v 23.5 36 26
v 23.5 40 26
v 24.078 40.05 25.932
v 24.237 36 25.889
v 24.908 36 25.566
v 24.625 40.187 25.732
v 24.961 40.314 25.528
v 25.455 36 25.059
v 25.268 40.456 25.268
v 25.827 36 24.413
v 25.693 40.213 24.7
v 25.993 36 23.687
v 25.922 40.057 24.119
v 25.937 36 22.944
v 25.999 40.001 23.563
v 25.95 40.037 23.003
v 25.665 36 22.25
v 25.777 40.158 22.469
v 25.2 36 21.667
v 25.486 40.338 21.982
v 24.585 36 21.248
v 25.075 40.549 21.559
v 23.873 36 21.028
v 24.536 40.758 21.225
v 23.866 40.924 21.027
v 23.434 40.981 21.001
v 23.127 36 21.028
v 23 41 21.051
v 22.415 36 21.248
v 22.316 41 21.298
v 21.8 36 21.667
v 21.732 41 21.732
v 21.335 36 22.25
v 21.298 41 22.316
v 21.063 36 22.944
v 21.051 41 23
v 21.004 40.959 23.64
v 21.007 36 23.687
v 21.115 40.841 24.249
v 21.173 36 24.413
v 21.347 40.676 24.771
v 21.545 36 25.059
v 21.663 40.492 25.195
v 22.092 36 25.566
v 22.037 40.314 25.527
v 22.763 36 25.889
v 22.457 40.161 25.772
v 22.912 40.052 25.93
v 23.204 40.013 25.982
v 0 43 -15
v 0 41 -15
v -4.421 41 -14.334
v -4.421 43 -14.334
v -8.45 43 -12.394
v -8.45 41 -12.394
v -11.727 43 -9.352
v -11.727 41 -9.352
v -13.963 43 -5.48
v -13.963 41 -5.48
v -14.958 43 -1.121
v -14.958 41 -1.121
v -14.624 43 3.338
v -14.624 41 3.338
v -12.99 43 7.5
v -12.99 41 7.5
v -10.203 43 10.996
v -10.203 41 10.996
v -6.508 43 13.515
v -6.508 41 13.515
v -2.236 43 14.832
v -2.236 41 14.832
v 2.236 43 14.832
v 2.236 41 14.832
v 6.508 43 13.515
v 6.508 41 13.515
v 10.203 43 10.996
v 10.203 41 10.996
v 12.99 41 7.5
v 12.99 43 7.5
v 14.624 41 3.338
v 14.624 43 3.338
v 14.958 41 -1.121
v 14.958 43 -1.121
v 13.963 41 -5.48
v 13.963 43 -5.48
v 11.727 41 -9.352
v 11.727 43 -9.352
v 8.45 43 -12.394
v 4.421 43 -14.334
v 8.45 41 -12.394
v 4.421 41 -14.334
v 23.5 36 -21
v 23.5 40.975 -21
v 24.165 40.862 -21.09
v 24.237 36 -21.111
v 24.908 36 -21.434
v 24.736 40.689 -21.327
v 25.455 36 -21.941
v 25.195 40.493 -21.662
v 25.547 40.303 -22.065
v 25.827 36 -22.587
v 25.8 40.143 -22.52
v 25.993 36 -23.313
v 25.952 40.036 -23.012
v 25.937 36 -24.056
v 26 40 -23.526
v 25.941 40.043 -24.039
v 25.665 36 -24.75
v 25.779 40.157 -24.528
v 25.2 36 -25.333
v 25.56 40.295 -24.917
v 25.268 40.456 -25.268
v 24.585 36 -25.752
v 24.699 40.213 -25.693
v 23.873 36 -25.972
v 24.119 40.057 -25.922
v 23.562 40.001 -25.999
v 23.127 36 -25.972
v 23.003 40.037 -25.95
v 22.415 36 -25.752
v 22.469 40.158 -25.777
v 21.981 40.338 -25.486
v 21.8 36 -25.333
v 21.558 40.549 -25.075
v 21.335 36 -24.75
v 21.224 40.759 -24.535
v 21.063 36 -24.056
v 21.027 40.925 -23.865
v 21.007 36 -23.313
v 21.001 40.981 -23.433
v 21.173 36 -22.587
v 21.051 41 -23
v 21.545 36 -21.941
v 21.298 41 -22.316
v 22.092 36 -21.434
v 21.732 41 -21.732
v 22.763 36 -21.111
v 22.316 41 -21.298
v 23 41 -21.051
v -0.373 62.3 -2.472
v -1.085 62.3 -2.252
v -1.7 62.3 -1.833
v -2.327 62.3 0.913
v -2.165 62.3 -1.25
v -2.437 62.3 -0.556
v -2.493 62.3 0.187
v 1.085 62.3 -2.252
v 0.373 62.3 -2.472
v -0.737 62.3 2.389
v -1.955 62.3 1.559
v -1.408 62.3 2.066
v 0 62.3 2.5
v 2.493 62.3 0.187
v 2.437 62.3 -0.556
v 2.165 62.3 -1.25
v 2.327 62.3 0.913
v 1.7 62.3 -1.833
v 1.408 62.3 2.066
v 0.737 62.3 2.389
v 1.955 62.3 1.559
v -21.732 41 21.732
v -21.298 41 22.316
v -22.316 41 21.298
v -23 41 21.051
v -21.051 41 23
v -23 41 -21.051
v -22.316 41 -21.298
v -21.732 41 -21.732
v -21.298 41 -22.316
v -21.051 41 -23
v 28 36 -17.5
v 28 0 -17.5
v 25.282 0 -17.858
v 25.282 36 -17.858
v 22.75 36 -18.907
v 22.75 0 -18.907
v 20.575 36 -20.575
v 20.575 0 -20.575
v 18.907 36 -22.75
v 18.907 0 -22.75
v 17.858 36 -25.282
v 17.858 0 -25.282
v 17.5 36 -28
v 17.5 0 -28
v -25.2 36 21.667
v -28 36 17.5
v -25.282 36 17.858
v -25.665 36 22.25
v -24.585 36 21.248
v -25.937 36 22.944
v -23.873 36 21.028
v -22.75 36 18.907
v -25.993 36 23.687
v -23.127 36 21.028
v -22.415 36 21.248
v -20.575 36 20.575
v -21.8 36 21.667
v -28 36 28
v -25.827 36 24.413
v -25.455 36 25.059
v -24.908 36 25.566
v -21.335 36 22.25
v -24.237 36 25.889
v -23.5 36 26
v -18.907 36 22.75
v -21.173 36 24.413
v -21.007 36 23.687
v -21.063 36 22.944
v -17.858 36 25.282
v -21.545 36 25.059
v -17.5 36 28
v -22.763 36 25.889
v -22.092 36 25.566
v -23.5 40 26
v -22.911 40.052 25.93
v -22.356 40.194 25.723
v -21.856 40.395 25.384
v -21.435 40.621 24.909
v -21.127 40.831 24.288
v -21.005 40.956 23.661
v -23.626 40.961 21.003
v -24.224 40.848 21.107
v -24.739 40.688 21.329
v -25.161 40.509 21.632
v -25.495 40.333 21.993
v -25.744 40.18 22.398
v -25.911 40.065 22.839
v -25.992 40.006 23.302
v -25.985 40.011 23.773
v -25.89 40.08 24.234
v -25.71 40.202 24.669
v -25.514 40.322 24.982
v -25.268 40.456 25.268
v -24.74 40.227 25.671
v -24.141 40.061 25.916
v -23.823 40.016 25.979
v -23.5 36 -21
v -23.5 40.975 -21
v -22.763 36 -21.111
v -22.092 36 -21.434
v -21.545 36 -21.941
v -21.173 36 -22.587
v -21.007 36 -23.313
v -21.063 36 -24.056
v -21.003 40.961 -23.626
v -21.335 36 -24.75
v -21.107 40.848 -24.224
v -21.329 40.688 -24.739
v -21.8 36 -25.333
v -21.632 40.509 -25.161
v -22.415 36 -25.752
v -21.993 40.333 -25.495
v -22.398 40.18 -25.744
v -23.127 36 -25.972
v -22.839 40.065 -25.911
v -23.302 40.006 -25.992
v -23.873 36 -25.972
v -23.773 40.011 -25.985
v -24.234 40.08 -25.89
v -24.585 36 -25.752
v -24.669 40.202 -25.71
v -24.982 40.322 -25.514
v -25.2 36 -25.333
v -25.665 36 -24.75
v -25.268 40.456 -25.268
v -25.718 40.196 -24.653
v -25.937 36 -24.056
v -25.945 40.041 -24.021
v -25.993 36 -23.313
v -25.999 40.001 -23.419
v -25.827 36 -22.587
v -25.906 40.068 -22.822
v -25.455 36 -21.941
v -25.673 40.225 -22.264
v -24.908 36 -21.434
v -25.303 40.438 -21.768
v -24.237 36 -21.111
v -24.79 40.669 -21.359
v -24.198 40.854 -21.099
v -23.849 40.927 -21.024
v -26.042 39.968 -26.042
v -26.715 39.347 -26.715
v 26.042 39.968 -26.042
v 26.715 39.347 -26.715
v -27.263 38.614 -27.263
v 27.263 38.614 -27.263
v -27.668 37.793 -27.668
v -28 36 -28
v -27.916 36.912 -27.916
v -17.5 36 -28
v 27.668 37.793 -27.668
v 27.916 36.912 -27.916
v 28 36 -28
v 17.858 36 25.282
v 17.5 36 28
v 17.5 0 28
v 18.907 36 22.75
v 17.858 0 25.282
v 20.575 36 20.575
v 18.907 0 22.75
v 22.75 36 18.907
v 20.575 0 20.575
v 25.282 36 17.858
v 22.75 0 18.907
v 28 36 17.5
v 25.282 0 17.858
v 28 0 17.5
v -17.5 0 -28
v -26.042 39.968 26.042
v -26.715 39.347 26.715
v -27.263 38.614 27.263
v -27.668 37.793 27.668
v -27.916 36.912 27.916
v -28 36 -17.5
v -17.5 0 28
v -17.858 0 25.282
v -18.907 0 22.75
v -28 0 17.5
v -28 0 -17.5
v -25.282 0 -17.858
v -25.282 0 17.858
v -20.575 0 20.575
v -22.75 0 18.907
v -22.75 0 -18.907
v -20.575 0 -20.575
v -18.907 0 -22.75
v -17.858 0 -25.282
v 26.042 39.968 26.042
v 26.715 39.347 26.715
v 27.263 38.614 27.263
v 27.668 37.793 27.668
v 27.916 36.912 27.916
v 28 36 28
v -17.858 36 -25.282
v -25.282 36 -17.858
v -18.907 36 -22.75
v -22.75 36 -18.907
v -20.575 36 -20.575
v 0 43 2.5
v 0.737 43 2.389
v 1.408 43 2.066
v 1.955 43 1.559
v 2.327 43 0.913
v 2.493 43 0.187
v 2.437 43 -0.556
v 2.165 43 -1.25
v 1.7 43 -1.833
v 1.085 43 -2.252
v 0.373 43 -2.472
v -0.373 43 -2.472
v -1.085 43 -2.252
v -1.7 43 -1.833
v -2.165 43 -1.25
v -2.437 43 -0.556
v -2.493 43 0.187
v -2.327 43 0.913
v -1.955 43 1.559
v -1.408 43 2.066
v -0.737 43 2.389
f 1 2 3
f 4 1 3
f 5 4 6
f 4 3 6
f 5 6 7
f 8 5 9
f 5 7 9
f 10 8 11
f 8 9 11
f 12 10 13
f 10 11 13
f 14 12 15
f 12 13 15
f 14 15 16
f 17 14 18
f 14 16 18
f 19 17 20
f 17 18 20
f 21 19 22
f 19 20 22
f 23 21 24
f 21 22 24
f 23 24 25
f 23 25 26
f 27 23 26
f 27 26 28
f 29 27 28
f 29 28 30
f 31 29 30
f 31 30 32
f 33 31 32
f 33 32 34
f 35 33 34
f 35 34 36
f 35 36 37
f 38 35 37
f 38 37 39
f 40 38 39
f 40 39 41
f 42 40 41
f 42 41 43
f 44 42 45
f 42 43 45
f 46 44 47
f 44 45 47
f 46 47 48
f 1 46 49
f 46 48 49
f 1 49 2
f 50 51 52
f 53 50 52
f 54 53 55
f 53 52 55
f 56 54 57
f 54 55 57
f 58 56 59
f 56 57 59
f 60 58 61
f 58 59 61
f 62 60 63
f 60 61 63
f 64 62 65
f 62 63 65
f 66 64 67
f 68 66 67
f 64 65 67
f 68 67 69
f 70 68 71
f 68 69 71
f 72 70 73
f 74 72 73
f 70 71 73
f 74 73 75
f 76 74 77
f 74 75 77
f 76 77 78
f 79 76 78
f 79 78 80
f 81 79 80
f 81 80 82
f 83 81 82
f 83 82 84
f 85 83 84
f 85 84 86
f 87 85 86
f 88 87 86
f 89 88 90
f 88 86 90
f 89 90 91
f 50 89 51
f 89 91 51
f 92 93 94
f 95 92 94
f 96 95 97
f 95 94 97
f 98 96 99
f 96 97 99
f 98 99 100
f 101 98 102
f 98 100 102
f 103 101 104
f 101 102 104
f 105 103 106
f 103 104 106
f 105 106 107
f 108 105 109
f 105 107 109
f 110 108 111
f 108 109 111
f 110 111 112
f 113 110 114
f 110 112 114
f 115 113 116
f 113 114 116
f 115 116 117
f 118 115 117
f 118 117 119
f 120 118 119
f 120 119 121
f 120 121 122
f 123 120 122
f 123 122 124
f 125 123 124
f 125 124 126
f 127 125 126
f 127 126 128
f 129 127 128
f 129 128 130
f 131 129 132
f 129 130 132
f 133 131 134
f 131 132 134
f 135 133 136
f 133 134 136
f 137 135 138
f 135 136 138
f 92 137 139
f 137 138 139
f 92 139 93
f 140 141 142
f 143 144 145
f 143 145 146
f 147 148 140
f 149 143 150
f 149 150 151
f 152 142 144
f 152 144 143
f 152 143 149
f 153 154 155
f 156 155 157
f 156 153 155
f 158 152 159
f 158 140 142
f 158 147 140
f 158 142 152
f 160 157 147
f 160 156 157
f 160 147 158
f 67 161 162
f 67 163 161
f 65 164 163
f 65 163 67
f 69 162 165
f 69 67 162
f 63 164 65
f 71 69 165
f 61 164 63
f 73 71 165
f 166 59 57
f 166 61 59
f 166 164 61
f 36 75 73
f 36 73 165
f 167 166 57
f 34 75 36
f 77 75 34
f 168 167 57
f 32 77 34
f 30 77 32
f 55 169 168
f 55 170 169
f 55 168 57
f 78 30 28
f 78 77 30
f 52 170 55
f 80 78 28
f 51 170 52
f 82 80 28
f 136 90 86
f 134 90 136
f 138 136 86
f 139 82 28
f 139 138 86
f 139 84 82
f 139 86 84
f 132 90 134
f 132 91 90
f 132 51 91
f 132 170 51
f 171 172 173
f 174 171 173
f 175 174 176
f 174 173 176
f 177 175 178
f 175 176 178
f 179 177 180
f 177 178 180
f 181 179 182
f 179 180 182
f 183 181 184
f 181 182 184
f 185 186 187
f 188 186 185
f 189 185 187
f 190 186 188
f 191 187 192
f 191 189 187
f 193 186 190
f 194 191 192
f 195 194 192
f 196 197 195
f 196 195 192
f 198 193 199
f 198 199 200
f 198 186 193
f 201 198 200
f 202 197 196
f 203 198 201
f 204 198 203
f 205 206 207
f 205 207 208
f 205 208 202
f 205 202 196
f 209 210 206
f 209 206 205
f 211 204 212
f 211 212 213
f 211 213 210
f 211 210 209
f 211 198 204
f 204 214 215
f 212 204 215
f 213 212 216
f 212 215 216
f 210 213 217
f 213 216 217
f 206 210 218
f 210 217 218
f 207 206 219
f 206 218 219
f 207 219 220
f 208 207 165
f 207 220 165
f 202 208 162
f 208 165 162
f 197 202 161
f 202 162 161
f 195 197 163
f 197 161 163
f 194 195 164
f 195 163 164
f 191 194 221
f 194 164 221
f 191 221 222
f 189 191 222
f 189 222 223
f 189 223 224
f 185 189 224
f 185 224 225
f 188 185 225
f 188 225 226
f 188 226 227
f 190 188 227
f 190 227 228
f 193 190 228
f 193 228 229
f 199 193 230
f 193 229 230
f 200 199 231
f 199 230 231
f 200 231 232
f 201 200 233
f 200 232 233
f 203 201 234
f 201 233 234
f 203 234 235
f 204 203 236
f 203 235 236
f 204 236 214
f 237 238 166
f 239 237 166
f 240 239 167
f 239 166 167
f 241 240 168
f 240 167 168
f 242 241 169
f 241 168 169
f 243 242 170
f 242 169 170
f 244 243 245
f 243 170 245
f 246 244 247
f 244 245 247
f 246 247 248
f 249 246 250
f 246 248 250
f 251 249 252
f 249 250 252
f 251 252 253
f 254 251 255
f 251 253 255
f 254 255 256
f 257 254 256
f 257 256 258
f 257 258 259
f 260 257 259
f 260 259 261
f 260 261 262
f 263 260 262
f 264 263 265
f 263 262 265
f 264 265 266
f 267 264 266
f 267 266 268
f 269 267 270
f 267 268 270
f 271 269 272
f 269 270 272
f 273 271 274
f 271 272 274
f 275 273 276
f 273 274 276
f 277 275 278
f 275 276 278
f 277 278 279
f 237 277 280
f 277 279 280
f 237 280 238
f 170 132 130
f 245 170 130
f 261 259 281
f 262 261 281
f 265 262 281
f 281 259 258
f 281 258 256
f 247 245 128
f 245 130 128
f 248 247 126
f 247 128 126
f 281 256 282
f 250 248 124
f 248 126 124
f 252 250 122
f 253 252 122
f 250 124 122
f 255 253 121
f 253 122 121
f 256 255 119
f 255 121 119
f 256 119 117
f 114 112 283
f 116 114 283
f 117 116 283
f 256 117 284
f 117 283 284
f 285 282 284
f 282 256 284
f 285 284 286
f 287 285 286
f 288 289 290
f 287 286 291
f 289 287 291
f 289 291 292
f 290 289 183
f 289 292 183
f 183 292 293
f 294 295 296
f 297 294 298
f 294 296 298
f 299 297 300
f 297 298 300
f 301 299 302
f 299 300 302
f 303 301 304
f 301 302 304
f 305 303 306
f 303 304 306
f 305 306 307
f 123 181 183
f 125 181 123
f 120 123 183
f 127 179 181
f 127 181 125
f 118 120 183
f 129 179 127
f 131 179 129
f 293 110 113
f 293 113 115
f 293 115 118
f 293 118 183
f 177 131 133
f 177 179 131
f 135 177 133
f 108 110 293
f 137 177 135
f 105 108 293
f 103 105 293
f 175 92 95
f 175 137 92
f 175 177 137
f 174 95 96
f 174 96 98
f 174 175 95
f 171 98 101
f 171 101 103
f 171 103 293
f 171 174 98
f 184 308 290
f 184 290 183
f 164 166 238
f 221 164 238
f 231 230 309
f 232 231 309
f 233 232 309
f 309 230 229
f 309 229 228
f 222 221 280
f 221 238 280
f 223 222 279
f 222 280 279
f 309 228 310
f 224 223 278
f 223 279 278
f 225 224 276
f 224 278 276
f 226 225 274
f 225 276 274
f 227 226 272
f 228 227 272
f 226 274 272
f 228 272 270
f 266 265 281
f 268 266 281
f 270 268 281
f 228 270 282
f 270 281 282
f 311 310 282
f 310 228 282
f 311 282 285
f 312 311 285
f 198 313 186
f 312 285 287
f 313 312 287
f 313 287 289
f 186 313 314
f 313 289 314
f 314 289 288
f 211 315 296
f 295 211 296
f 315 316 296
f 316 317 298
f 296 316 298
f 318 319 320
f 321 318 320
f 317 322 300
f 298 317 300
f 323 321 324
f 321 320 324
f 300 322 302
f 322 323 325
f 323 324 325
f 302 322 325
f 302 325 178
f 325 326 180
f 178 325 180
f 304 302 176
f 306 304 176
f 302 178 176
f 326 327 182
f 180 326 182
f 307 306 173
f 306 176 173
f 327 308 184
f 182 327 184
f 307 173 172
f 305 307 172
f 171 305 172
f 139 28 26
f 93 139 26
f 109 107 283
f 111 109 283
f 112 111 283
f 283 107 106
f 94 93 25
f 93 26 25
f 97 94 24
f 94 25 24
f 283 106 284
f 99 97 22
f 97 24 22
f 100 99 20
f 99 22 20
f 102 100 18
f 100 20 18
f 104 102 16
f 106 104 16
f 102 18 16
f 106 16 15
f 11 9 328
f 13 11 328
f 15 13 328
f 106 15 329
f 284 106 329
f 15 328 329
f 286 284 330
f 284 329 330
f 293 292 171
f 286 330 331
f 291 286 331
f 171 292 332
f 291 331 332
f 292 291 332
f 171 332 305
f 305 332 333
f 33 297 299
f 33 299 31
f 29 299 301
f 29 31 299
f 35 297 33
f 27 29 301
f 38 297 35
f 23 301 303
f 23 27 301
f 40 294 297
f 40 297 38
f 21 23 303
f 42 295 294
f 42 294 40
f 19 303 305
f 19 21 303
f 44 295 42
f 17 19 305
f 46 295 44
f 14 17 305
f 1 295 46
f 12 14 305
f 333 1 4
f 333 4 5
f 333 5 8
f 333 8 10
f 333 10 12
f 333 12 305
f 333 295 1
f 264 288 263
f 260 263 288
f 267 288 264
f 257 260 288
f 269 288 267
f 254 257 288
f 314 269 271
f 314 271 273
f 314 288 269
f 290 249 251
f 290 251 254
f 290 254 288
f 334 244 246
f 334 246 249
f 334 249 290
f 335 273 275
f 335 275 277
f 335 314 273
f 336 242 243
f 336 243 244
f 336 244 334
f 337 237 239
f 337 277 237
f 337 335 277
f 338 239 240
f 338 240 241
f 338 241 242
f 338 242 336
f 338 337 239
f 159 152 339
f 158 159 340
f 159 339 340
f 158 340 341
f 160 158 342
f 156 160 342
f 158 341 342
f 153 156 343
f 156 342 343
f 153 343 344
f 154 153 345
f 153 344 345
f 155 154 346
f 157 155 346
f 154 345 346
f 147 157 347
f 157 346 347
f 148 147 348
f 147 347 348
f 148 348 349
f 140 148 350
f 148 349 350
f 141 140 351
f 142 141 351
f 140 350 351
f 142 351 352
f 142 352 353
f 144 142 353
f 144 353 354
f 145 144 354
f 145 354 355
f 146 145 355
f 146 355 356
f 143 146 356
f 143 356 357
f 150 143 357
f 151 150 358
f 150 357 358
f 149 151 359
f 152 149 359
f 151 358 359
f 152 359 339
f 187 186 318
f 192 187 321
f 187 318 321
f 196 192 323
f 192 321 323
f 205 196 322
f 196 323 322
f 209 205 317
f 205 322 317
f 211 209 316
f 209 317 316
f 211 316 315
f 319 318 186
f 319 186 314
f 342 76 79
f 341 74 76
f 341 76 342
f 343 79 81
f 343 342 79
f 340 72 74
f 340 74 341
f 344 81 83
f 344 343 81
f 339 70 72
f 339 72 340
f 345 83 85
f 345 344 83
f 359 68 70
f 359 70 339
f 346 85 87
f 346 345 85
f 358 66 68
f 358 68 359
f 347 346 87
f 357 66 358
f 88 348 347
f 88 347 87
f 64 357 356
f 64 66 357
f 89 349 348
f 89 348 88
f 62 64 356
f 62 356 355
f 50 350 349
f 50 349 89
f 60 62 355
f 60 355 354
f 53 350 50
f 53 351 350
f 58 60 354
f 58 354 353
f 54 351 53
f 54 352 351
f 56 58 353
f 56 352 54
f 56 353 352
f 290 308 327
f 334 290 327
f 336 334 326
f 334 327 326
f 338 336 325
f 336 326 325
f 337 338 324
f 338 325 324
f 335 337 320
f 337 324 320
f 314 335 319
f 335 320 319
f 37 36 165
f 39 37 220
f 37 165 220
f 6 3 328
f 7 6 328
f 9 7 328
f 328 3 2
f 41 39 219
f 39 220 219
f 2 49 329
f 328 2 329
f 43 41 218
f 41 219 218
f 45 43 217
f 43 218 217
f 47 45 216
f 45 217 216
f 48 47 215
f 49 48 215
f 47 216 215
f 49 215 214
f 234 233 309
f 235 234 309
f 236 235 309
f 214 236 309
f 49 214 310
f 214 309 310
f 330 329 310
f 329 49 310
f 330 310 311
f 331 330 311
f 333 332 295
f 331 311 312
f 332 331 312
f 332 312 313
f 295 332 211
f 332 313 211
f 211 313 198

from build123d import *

# Parameters (mm, degrees)
SCHIZZO1_W                   = 56
SCHIZZO1_H                   = 56
ESTRUSIONE_ESTRUSIONE1_DEPTH = 41
SCHIZZO2_R                   = 2.5
TAGLIO_ESTRUSIONE1_DEPTH     = 41
SCHIZZO3_R                   = 15
ESTRUSIONE_ESTRUSIONE3_DEPTH = 2
SCHIZZO4_R                   = 2.5
ESTRUSIONE_ESTRUSIONE4_DEPTH = 19.3
SCHIZZO5_R                   = 10.5
TAGLIO_ESTRUSIONE2_DEPTH     = 36
CONG_1_R                     = 5


with BuildPart() as part:
    # Schizzo1 → Estrusione-Estrusione1 (new body)
    with BuildSketch(Plane(origin=(0, 0, 0), x_dir=(1, 0, 0), z_dir=(0, 1, 0))):
        Rectangle(SCHIZZO1_W, SCHIZZO1_H)
    extrude(amount=ESTRUSIONE_ESTRUSIONE1_DEPTH)

    # Schizzo2 → Taglio-Estrusione1 (cut)
    with BuildSketch(Plane(origin=(0, 41, 0), x_dir=(1, 0, 0), z_dir=(0, 1, 0))):
        with Locations(Location((-23.5, 23.5, 0), (0, 0, 270))):
            Circle(SCHIZZO2_R)
        with Locations(Location((23.5, 23.5, 0), (0, 0, 270))):
            Circle(SCHIZZO2_R)
        with Locations(Location((23.5, -23.5, 0), (0, 0, 270))):
            Circle(SCHIZZO2_R)
        with Locations(Location((-23.5, -23.5, 0), (0, 0, 270))):
            Circle(SCHIZZO2_R)
    extrude(amount=-TAGLIO_ESTRUSIONE1_DEPTH, mode=Mode.SUBTRACT)

    # Schizzo3 → Estrusione-Estrusione3 (add)
    with BuildSketch(Plane(origin=(0, 41, 0), x_dir=(1, 0, 0), z_dir=(0, 1, 0))):
        with Locations(Location((0, 0, 0), (0, 0, 90))):
            Circle(SCHIZZO3_R)
    extrude(amount=ESTRUSIONE_ESTRUSIONE3_DEPTH)

    # Schizzo4 → Estrusione-Estrusione4 (add)
    with BuildSketch(Plane(origin=(0, 43, 0), x_dir=(1, 0, 0), z_dir=(0, 1, 0))):
        with Locations(Location((0, 0, 0), (0, 0, 270))):
            Circle(SCHIZZO4_R)
    extrude(amount=ESTRUSIONE_ESTRUSIONE4_DEPTH)

    # Schizzo5 → Taglio-Estrusione2 (cut)
    with BuildSketch(Plane.XZ):
        with Locations((-28, 28)):
            Circle(SCHIZZO5_R)
        with Locations((28, 28)):
            Circle(SCHIZZO5_R)
        with Locations((28, -28)):
            Circle(SCHIZZO5_R)
        with Locations((-28, -28)):
            Circle(SCHIZZO5_R)
    extrude(amount=-TAGLIO_ESTRUSIONE2_DEPTH, mode=Mode.SUBTRACT)

    # Congé1
    # the kernel refuses this fillet: 5 mm, written as the material it takes off along each edge
    with BuildSketch(Plane(origin=(40.5, 41, -28), x_dir=(0, 0, 1), z_dir=(-1, 0, 0)), Plane(origin=(-28, 41, -40.5), x_dir=(1, 0, 0), z_dir=(0, 0, 1))) as cong_1_piece_1:
        with BuildLine():
            CenterArc((CONG_1_R, -CONG_1_R), CONG_1_R, 90, 90)
            Line((0, -CONG_1_R), (0, 0))
            Line((0, 0), (CONG_1_R, 0))
        make_face()
    extrude(amount=81, mode=Mode.SUBTRACT)
    with BuildSketch(Plane(origin=(-40.5, 41, 28), x_dir=(0, -1, 0), z_dir=(1, 0, 0)), Plane(origin=(28, 41, 40.5), x_dir=(0, -1, 0), z_dir=(0, 0, -1))) as cong_1_piece_2:
        with BuildLine():
            CenterArc((CONG_1_R, CONG_1_R), CONG_1_R, 180, 90)
            Line((0, CONG_1_R), (0, 0))
            Line((0, 0), (CONG_1_R, 0))
        make_face()
    extrude(amount=81, mode=Mode.SUBTRACT)


solid = part.part
